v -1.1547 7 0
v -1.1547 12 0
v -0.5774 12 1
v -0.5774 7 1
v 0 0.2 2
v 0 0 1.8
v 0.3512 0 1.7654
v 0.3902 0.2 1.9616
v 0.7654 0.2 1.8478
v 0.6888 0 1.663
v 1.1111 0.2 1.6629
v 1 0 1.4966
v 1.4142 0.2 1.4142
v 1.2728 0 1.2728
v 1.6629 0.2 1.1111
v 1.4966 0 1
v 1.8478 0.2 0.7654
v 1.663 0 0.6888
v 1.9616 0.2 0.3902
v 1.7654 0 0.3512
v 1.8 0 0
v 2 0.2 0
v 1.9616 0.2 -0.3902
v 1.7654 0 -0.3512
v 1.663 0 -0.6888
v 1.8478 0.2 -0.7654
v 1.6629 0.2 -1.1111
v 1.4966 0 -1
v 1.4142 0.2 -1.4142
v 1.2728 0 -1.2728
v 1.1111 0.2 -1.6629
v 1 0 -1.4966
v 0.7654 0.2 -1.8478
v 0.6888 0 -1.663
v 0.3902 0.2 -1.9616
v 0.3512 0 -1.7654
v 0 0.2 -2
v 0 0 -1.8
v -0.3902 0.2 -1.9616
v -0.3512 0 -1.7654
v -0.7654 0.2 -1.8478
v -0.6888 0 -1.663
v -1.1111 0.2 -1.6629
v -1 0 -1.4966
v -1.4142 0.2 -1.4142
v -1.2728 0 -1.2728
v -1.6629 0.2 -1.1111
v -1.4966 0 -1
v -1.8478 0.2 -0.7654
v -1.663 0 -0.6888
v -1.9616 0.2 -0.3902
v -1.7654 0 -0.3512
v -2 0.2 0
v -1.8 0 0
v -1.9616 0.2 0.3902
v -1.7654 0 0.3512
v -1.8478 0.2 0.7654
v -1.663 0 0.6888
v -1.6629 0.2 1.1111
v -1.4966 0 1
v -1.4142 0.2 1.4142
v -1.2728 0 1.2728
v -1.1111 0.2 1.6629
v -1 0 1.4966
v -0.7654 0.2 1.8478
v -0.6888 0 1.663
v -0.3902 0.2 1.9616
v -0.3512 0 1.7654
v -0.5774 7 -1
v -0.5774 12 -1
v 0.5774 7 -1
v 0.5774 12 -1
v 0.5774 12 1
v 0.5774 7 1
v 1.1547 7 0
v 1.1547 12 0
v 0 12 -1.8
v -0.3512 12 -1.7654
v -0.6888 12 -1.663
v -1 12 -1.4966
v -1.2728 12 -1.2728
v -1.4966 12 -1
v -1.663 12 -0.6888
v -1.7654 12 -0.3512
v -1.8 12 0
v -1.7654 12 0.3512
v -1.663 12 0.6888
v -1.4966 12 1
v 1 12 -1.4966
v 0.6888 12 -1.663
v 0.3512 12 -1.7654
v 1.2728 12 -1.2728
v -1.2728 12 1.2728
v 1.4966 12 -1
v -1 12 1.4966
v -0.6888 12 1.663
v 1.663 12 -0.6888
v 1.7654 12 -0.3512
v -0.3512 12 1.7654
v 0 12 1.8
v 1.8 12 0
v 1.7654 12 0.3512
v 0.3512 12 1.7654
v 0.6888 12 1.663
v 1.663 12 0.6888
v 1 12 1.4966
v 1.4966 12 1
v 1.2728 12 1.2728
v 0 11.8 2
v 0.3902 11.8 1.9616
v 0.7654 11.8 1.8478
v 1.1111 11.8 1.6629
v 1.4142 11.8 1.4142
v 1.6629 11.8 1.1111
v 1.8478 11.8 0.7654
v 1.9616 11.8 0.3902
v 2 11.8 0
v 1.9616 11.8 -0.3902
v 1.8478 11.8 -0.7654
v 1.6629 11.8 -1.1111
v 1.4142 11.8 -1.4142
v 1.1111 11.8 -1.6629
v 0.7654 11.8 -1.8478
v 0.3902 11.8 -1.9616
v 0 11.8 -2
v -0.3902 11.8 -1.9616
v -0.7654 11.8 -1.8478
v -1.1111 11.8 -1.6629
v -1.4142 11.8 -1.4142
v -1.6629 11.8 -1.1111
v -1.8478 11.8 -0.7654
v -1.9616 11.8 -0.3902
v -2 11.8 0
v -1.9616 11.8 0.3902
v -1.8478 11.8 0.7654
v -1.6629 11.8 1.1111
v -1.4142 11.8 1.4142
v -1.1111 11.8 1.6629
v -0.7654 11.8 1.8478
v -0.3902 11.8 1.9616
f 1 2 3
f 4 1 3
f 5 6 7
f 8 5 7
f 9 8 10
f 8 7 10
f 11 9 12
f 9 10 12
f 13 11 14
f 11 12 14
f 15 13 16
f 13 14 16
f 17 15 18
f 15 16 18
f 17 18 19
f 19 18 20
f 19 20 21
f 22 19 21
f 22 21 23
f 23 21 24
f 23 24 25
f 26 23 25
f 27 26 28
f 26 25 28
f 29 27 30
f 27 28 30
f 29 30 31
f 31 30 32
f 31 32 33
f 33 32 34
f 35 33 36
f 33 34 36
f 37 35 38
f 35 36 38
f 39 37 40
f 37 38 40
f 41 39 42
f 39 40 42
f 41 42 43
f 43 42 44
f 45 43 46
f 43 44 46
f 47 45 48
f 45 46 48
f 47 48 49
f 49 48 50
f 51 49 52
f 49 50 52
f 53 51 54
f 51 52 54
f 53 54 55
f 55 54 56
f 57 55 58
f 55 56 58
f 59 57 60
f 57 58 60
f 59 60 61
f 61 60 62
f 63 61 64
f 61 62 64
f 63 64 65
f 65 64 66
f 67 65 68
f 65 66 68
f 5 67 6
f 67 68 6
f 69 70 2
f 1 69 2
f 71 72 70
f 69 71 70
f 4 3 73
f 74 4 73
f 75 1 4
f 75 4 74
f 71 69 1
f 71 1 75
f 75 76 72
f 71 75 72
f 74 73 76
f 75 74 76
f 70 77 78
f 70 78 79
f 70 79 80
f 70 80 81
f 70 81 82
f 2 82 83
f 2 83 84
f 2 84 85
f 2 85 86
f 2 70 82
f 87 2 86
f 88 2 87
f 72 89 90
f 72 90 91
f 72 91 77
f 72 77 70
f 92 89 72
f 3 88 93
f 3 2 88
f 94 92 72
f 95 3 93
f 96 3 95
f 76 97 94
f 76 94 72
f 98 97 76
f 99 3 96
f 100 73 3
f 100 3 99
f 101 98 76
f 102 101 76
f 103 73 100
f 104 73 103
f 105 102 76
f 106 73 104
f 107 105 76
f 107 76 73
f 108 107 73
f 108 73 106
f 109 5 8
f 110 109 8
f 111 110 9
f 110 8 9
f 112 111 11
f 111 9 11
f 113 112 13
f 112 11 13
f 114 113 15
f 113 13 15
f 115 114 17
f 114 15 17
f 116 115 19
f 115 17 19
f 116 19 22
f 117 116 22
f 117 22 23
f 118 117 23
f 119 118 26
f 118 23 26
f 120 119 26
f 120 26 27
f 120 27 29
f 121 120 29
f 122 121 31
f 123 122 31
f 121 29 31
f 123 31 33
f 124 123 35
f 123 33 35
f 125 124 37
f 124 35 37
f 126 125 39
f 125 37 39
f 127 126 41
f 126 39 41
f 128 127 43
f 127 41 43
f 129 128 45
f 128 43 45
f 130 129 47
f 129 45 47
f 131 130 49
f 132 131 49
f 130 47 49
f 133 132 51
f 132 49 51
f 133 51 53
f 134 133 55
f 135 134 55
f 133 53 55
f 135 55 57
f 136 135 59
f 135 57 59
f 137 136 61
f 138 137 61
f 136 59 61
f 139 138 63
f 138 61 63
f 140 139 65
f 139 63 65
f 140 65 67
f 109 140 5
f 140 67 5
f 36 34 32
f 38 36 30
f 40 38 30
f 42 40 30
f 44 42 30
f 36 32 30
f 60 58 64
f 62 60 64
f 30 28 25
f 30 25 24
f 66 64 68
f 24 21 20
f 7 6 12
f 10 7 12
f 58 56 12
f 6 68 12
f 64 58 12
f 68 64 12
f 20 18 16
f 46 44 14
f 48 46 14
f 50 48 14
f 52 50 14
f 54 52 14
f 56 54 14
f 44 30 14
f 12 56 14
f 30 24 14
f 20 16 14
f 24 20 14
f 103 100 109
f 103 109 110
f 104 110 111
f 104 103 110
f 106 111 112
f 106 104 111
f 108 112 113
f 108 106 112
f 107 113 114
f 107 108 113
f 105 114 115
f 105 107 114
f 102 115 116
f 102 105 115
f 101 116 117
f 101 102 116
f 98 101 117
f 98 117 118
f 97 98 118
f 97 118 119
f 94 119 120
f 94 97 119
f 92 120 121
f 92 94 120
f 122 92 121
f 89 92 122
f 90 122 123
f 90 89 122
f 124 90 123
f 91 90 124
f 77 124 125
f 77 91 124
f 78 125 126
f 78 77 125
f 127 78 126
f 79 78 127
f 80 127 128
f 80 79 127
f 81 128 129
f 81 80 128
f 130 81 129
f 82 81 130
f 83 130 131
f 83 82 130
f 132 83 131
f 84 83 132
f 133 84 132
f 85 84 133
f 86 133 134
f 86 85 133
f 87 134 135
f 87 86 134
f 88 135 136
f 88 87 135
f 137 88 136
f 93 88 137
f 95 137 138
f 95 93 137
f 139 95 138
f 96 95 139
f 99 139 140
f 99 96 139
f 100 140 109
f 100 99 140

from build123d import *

# Parameters (mm, degrees)
SKETCH_1_R          = 2
EXTRUDE_1_DEPTH     = 12
CHAMFER_1_SIZE      = 0.2
CUT_EXTRUDE_1_DEPTH = 5


with BuildPart() as part:
    # 草图1 → 凸台-拉伸1 (new body)
    with BuildSketch(Plane(origin=(0, 0, 0), x_dir=(1, 0, 0), z_dir=(0, 1, 0))):
        with Locations(Location((0, 0, 0), (0, 0, 270))):
            Circle(SKETCH_1_R)
    extrude(amount=EXTRUDE_1_DEPTH)

    # 倒角1
    chamfer_1_edges = [part.edges().sort_by_distance(p)[0] for p in [
        (0, 0, -2),
        (0, 12, -2),
    ]]
    chamfer(chamfer_1_edges, length=CHAMFER_1_SIZE)

    # 草图2 → 切除-拉伸1 (cut)
    with BuildSketch(Plane(origin=(0, 12, 0), x_dir=(1, 0, 0), z_dir=(0, 1, 0))):
        Polygon((-1.154700538, 0), (-0.577350269, -1), (0.577350269, -1), (1.154700538, 0), (0.577350269, 1), (-0.577350269, 1), align=None)
    extrude(amount=-CUT_EXTRUDE_1_DEPTH, mode=Mode.SUBTRACT)


solid = part.part
